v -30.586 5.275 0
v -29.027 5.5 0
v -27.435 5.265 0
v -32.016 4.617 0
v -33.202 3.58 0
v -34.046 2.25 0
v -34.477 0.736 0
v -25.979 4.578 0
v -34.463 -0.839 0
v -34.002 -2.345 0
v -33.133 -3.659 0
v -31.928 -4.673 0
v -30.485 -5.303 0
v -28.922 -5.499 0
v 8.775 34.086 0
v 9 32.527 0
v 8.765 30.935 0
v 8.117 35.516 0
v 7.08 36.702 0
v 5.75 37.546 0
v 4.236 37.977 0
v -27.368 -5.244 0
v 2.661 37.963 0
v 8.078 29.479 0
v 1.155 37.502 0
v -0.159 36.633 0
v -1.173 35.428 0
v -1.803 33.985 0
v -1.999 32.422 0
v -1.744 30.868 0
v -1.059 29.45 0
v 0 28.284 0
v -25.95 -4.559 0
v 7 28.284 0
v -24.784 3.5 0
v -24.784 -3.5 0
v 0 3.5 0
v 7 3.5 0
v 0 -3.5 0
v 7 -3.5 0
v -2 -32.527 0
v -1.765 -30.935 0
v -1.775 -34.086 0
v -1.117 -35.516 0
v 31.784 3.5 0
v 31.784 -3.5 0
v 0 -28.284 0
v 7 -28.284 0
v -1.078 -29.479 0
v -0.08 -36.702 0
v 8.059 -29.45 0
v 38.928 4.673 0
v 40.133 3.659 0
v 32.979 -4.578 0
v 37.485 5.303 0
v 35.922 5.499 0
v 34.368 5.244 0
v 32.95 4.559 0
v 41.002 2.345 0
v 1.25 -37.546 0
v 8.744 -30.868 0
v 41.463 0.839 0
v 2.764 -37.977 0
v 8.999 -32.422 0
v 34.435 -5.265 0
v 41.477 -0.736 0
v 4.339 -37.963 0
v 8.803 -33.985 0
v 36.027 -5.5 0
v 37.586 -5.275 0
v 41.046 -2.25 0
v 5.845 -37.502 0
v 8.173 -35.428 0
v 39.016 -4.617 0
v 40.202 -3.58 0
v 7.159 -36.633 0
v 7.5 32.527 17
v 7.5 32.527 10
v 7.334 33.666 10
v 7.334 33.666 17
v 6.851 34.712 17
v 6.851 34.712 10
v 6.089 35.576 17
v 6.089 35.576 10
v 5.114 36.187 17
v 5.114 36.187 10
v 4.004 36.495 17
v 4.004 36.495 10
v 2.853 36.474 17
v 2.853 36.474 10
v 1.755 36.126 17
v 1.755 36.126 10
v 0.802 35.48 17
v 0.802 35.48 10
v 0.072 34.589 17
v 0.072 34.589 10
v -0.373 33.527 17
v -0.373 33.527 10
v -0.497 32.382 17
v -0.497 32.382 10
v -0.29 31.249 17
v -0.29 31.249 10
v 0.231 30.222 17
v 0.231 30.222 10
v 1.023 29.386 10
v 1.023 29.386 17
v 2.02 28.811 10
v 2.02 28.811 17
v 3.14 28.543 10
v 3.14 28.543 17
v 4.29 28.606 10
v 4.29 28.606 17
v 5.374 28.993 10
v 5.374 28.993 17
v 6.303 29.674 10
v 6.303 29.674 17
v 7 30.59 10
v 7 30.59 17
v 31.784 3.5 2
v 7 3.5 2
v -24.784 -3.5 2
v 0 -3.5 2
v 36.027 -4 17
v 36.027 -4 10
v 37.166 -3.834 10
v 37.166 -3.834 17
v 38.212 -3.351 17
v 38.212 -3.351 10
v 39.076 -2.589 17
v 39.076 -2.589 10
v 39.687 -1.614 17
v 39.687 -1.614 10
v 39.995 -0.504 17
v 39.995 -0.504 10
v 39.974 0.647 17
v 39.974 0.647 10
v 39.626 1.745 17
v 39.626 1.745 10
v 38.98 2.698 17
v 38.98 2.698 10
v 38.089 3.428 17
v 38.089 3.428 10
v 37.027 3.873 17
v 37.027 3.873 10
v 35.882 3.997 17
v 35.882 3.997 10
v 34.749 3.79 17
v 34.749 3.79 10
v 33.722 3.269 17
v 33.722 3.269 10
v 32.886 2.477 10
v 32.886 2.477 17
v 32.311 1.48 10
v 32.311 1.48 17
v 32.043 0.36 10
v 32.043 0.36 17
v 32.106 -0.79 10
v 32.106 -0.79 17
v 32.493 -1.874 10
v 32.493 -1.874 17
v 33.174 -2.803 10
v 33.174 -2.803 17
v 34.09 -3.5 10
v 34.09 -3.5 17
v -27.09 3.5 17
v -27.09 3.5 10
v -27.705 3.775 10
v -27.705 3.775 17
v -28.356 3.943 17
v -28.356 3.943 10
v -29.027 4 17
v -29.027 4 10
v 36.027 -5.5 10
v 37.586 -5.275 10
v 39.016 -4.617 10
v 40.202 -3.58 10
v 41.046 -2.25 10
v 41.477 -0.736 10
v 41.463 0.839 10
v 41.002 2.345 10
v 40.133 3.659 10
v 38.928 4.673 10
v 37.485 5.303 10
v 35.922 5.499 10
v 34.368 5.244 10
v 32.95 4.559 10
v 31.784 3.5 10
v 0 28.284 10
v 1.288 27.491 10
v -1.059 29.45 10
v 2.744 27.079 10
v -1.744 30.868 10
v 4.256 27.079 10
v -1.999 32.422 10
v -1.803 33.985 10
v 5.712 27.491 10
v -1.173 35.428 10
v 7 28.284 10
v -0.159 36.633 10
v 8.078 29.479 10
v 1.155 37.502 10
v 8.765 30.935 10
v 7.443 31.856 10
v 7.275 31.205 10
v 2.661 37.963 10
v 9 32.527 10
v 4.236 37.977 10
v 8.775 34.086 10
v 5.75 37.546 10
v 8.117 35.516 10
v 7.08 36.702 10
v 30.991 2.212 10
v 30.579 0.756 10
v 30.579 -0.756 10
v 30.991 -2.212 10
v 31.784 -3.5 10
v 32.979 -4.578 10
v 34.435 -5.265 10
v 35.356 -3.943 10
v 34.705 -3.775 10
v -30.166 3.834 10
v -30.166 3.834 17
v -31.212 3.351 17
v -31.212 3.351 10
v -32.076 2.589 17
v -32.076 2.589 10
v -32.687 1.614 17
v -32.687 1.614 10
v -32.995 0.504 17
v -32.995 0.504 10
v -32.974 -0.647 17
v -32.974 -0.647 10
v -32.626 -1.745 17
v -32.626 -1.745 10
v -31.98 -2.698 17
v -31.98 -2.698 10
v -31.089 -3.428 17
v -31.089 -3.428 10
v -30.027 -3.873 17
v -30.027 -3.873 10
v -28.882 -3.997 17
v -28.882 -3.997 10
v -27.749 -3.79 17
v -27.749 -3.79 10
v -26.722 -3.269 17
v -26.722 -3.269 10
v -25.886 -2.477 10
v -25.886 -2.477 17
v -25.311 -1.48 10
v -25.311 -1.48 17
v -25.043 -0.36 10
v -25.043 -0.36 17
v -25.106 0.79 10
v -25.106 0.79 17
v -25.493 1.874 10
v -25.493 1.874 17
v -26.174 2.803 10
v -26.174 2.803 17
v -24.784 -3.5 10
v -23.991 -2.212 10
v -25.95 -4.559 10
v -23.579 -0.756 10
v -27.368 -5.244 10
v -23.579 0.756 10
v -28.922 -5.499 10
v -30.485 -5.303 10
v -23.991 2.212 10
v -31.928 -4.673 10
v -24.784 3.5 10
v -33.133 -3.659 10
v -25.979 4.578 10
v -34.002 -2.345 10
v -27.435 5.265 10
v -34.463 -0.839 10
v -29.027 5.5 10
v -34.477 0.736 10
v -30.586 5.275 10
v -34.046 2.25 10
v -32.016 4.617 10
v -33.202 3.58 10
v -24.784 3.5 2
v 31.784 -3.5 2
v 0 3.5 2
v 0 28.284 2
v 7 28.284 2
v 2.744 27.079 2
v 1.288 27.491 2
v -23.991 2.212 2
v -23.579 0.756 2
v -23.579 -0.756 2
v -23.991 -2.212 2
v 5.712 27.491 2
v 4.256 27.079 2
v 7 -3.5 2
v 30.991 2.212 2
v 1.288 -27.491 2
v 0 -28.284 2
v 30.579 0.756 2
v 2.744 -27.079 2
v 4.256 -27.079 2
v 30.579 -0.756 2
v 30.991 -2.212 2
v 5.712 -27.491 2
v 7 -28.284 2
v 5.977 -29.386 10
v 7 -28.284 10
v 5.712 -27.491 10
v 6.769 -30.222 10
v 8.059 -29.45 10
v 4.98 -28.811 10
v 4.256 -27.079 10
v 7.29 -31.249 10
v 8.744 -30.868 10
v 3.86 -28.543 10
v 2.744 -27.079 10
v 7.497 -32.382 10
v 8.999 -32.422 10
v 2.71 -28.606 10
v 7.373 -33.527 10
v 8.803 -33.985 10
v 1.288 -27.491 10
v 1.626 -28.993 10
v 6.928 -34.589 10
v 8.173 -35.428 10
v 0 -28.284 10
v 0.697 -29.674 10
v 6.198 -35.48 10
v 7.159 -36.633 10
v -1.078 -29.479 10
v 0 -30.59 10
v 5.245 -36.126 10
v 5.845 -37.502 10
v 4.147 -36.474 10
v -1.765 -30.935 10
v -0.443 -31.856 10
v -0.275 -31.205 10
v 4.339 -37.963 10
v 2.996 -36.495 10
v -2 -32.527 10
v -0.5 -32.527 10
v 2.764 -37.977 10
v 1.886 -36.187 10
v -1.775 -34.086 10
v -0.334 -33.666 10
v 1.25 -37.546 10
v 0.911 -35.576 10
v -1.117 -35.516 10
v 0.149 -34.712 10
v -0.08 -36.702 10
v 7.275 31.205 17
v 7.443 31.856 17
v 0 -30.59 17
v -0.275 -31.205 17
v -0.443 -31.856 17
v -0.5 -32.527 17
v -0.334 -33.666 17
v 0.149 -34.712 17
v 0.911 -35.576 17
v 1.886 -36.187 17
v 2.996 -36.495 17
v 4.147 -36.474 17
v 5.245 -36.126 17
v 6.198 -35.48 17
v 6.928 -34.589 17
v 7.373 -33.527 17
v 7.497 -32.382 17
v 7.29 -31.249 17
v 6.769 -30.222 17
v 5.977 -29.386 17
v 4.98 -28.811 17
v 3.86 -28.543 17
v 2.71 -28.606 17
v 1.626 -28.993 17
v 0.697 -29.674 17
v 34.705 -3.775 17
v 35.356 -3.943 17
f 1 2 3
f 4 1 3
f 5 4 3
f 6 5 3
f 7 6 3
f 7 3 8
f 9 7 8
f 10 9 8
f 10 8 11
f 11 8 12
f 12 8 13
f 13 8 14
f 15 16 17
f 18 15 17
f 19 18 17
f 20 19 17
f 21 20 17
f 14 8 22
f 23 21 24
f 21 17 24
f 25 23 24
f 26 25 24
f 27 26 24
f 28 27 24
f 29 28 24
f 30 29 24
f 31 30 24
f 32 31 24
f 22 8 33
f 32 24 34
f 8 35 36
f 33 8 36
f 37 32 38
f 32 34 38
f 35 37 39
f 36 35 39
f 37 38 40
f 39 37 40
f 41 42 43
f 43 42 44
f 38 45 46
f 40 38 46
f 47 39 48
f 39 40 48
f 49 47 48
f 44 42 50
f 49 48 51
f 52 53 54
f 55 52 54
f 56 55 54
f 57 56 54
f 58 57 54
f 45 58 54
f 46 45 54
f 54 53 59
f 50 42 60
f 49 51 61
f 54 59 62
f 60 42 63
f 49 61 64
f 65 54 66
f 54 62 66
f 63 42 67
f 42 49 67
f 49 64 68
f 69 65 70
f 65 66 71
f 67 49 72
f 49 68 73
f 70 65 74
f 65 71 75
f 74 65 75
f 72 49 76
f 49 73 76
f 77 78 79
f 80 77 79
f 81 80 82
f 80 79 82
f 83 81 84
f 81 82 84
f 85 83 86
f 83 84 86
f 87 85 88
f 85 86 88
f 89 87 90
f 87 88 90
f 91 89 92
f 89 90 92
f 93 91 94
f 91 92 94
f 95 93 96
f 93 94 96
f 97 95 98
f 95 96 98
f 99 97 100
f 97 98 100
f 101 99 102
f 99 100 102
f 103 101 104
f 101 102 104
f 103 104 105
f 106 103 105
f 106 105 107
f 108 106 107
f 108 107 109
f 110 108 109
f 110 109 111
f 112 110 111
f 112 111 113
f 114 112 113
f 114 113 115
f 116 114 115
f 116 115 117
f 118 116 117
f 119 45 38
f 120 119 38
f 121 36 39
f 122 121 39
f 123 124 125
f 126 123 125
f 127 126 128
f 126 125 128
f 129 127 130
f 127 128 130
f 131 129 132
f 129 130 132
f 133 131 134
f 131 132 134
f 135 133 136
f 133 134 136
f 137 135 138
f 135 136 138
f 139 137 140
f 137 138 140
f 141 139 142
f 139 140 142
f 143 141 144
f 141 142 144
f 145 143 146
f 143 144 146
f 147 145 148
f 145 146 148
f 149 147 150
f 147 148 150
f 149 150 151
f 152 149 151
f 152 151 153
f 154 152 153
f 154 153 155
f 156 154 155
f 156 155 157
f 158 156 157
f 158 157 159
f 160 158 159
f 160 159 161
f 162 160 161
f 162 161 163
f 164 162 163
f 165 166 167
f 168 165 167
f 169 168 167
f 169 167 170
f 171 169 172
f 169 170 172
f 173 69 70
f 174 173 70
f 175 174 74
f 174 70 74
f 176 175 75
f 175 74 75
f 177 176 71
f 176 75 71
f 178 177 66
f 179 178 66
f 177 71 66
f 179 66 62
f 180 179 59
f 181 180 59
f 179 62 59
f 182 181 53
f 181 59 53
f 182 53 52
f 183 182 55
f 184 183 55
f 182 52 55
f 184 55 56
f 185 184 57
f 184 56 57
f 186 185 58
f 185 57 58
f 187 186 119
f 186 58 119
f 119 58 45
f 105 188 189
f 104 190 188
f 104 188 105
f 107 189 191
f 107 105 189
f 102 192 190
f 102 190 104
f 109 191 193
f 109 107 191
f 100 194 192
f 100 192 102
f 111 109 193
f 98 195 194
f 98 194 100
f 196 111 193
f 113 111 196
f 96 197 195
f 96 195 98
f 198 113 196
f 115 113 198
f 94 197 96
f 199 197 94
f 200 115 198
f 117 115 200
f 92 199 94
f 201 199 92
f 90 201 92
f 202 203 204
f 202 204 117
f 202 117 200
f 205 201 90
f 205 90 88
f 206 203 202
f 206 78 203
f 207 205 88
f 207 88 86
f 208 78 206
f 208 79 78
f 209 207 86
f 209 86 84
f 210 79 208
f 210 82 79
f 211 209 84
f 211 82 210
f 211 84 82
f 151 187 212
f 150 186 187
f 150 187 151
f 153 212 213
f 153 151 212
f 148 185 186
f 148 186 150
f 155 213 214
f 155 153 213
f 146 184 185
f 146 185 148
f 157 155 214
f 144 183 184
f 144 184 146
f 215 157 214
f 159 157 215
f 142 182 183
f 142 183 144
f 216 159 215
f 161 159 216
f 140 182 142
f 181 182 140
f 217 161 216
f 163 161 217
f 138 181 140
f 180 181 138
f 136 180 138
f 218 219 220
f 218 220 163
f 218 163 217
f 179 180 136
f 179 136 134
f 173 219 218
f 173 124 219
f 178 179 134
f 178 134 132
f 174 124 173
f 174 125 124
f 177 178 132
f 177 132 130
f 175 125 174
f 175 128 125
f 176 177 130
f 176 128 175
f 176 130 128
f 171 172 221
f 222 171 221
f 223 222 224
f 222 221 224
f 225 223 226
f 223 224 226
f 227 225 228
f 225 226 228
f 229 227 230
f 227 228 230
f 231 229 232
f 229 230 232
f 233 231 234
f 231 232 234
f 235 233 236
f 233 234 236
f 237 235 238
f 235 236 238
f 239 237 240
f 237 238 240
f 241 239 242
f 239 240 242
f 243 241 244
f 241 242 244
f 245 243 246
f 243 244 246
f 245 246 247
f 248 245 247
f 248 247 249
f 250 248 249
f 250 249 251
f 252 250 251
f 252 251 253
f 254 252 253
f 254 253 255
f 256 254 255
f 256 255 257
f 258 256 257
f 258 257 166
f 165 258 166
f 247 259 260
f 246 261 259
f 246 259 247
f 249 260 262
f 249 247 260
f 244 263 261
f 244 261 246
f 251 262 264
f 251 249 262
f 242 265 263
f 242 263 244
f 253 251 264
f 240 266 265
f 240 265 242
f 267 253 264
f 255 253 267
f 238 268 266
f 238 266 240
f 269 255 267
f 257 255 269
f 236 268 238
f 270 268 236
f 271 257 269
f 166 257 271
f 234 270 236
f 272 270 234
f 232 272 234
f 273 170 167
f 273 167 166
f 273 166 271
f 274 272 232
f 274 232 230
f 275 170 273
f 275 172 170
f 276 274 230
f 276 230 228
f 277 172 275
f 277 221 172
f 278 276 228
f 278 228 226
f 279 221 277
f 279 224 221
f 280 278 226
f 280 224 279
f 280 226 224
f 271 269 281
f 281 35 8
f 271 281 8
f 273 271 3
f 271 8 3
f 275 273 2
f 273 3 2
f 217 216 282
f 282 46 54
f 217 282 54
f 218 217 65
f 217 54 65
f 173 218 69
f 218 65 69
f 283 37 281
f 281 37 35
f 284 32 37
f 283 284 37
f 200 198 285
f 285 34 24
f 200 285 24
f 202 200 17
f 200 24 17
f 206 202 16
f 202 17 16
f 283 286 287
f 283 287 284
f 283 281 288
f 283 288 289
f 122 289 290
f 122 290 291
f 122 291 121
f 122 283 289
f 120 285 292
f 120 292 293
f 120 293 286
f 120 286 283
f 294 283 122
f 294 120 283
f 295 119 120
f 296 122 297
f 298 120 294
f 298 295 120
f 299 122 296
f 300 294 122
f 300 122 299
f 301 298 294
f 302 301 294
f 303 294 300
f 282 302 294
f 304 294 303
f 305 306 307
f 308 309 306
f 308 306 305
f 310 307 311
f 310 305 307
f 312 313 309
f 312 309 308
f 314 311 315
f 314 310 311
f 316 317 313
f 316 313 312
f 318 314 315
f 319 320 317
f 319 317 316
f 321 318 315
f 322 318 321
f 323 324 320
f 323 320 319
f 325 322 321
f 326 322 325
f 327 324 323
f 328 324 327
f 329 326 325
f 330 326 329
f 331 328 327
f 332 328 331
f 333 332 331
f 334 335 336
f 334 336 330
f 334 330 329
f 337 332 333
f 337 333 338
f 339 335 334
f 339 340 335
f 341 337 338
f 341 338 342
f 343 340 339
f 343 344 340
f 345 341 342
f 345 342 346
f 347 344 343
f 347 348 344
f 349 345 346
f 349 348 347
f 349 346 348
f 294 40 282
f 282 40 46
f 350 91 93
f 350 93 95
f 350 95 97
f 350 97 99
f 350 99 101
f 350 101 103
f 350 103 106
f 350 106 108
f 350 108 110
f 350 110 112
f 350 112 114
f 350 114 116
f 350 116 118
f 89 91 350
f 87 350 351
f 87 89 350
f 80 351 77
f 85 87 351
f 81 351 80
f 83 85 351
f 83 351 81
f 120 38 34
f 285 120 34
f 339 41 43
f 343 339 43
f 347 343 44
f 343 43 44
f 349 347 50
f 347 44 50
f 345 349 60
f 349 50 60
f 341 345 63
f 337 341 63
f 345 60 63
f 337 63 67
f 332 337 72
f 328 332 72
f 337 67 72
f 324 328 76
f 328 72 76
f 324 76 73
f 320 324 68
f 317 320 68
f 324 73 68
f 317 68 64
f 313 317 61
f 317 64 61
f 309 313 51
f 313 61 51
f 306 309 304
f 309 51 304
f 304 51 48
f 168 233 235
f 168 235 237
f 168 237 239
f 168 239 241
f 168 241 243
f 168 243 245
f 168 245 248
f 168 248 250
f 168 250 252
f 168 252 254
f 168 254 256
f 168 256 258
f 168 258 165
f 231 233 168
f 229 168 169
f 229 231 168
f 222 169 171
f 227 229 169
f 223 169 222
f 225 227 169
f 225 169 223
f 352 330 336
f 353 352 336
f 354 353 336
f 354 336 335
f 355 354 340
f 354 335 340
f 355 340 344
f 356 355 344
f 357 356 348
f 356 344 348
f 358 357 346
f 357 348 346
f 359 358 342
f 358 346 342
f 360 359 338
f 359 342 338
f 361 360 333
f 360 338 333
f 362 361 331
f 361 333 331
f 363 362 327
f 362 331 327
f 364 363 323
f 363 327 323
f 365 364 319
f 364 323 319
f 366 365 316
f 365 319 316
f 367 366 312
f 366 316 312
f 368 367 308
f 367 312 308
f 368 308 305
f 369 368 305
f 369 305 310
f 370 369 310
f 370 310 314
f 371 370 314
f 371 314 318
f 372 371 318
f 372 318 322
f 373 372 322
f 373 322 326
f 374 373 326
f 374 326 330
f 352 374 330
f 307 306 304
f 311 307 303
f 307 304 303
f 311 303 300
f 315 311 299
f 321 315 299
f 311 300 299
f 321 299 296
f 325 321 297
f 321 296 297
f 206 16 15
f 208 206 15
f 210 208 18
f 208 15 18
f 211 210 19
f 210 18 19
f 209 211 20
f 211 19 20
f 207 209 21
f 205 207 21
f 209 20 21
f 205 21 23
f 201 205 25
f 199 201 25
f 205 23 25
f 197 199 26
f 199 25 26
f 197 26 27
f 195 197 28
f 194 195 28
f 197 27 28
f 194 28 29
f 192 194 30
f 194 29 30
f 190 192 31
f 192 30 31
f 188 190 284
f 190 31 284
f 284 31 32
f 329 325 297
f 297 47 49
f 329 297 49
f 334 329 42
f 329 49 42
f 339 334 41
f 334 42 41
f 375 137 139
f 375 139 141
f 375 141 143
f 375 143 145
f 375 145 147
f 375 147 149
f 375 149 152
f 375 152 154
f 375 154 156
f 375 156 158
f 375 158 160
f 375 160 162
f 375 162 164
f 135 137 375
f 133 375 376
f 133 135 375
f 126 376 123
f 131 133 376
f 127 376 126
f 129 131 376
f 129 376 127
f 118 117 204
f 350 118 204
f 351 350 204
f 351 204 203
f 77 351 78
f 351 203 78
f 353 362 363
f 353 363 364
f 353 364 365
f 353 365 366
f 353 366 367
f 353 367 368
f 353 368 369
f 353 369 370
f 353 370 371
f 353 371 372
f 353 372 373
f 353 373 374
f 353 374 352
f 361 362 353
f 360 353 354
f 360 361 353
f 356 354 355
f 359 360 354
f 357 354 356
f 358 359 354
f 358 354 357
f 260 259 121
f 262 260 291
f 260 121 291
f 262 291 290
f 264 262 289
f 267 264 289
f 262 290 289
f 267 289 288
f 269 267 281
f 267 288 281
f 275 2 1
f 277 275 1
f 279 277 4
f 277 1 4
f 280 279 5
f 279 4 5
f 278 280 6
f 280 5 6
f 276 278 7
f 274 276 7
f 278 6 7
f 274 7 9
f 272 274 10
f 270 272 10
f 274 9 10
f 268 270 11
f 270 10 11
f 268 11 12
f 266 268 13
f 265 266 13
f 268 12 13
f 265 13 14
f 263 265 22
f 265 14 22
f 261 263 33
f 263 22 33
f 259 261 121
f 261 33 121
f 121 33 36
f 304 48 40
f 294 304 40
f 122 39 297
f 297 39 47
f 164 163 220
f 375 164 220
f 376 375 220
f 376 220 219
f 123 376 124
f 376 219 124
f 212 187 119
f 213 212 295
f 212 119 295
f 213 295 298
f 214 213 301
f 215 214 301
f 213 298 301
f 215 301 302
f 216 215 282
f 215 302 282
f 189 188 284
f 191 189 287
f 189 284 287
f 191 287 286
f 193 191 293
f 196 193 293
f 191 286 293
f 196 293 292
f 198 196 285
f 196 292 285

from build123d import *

# Parameters (mm, degrees)
F1_DEPTH = 2
F2_DEPTH = 10
F3_DEPTH = 17
F6_COUNT = 4


with BuildPart() as f1:
    # F0 (on Top) → F1 (new body)
    with BuildSketch(Plane.XY):
        with BuildLine():
            Line((0, 28.2842712475), (0, 0))
            Line((0, 0), (7, 0))
            Line((7, 0), (7, 28.2842712475))
            ThreePointArc((7, 28.2842712475), (3.5, 27.0269119346), (0, 28.2842712475))
        make_face()
    extrude(amount=F1_DEPTH)

    # F0 (on Top) → F2 (join)
    with BuildSketch(Plane.XY):
        with BuildLine():
            ThreePointArc((9, 32.5269119346), (1.1547921201, 37.5018491201), (0, 28.2842712475))
            Line((0, 28.2842712475), (0, 30.5904202615))
            ThreePointArc((0, 30.5904202615), (2.5, 36.3998952808), (7.5, 32.5269119346))
            ThreePointArc((7.5, 32.5269119346), (7.3729833462, 31.5269119346), (7, 30.5904202615))
            Line((7, 30.5904202615), (7, 28.2842712475))
            ThreePointArc((7, 28.2842712475), (8.4749371855, 30.1817040547), (9, 32.5269119346))
        make_face()
        with BuildLine():
            Line((0, 30.5904202615), (0, 28.2842712475))
            ThreePointArc((0, 28.2842712475), (3.5, 27.0269119346), (7, 28.2842712475))
            Line((7, 28.2842712475), (7, 30.5904202615))
            ThreePointArc((7, 30.5904202615), (3.5, 28.5269119346), (0, 30.5904202615))
        make_face()
    extrude(amount=F2_DEPTH)

    # F0 (on Top) → F3 (join)
    with BuildSketch(Plane.XY):
        with BuildLine():
            ThreePointArc((7.5, 32.5269119346), (2.5, 36.3998952808), (0, 30.5904202615))
            Line((0, 30.5904202615), (0, 32.5269119346))
            Line((0, 32.5269119346), (7, 32.5269119346))
            Line((7, 32.5269119346), (7, 30.5904202615))
            ThreePointArc((7, 30.5904202615), (7.3729833462, 31.5269119346), (7.5, 32.5269119346))
        make_face()
        with BuildLine():
            Line((0, 32.5269119346), (0, 30.5904202615))
            ThreePointArc((0, 30.5904202615), (3.5, 28.5269119346), (7, 30.5904202615))
            Line((7, 30.5904202615), (7, 32.5269119346))
            Line((7, 32.5269119346), (0, 32.5269119346))
        make_face()
    extrude(amount=F3_DEPTH)

    # F6: F1 ×4 about axis
    f6_axis = Axis((3.5, 0, 21.1911313236), (0, 0, 1))


with BuildPart() as f1_1:
    add(f1.part)
    for i in range(1, F6_COUNT):
        add(f1.part.rotate(f6_axis, i * 360 / F6_COUNT))


solid = f1_1.part
